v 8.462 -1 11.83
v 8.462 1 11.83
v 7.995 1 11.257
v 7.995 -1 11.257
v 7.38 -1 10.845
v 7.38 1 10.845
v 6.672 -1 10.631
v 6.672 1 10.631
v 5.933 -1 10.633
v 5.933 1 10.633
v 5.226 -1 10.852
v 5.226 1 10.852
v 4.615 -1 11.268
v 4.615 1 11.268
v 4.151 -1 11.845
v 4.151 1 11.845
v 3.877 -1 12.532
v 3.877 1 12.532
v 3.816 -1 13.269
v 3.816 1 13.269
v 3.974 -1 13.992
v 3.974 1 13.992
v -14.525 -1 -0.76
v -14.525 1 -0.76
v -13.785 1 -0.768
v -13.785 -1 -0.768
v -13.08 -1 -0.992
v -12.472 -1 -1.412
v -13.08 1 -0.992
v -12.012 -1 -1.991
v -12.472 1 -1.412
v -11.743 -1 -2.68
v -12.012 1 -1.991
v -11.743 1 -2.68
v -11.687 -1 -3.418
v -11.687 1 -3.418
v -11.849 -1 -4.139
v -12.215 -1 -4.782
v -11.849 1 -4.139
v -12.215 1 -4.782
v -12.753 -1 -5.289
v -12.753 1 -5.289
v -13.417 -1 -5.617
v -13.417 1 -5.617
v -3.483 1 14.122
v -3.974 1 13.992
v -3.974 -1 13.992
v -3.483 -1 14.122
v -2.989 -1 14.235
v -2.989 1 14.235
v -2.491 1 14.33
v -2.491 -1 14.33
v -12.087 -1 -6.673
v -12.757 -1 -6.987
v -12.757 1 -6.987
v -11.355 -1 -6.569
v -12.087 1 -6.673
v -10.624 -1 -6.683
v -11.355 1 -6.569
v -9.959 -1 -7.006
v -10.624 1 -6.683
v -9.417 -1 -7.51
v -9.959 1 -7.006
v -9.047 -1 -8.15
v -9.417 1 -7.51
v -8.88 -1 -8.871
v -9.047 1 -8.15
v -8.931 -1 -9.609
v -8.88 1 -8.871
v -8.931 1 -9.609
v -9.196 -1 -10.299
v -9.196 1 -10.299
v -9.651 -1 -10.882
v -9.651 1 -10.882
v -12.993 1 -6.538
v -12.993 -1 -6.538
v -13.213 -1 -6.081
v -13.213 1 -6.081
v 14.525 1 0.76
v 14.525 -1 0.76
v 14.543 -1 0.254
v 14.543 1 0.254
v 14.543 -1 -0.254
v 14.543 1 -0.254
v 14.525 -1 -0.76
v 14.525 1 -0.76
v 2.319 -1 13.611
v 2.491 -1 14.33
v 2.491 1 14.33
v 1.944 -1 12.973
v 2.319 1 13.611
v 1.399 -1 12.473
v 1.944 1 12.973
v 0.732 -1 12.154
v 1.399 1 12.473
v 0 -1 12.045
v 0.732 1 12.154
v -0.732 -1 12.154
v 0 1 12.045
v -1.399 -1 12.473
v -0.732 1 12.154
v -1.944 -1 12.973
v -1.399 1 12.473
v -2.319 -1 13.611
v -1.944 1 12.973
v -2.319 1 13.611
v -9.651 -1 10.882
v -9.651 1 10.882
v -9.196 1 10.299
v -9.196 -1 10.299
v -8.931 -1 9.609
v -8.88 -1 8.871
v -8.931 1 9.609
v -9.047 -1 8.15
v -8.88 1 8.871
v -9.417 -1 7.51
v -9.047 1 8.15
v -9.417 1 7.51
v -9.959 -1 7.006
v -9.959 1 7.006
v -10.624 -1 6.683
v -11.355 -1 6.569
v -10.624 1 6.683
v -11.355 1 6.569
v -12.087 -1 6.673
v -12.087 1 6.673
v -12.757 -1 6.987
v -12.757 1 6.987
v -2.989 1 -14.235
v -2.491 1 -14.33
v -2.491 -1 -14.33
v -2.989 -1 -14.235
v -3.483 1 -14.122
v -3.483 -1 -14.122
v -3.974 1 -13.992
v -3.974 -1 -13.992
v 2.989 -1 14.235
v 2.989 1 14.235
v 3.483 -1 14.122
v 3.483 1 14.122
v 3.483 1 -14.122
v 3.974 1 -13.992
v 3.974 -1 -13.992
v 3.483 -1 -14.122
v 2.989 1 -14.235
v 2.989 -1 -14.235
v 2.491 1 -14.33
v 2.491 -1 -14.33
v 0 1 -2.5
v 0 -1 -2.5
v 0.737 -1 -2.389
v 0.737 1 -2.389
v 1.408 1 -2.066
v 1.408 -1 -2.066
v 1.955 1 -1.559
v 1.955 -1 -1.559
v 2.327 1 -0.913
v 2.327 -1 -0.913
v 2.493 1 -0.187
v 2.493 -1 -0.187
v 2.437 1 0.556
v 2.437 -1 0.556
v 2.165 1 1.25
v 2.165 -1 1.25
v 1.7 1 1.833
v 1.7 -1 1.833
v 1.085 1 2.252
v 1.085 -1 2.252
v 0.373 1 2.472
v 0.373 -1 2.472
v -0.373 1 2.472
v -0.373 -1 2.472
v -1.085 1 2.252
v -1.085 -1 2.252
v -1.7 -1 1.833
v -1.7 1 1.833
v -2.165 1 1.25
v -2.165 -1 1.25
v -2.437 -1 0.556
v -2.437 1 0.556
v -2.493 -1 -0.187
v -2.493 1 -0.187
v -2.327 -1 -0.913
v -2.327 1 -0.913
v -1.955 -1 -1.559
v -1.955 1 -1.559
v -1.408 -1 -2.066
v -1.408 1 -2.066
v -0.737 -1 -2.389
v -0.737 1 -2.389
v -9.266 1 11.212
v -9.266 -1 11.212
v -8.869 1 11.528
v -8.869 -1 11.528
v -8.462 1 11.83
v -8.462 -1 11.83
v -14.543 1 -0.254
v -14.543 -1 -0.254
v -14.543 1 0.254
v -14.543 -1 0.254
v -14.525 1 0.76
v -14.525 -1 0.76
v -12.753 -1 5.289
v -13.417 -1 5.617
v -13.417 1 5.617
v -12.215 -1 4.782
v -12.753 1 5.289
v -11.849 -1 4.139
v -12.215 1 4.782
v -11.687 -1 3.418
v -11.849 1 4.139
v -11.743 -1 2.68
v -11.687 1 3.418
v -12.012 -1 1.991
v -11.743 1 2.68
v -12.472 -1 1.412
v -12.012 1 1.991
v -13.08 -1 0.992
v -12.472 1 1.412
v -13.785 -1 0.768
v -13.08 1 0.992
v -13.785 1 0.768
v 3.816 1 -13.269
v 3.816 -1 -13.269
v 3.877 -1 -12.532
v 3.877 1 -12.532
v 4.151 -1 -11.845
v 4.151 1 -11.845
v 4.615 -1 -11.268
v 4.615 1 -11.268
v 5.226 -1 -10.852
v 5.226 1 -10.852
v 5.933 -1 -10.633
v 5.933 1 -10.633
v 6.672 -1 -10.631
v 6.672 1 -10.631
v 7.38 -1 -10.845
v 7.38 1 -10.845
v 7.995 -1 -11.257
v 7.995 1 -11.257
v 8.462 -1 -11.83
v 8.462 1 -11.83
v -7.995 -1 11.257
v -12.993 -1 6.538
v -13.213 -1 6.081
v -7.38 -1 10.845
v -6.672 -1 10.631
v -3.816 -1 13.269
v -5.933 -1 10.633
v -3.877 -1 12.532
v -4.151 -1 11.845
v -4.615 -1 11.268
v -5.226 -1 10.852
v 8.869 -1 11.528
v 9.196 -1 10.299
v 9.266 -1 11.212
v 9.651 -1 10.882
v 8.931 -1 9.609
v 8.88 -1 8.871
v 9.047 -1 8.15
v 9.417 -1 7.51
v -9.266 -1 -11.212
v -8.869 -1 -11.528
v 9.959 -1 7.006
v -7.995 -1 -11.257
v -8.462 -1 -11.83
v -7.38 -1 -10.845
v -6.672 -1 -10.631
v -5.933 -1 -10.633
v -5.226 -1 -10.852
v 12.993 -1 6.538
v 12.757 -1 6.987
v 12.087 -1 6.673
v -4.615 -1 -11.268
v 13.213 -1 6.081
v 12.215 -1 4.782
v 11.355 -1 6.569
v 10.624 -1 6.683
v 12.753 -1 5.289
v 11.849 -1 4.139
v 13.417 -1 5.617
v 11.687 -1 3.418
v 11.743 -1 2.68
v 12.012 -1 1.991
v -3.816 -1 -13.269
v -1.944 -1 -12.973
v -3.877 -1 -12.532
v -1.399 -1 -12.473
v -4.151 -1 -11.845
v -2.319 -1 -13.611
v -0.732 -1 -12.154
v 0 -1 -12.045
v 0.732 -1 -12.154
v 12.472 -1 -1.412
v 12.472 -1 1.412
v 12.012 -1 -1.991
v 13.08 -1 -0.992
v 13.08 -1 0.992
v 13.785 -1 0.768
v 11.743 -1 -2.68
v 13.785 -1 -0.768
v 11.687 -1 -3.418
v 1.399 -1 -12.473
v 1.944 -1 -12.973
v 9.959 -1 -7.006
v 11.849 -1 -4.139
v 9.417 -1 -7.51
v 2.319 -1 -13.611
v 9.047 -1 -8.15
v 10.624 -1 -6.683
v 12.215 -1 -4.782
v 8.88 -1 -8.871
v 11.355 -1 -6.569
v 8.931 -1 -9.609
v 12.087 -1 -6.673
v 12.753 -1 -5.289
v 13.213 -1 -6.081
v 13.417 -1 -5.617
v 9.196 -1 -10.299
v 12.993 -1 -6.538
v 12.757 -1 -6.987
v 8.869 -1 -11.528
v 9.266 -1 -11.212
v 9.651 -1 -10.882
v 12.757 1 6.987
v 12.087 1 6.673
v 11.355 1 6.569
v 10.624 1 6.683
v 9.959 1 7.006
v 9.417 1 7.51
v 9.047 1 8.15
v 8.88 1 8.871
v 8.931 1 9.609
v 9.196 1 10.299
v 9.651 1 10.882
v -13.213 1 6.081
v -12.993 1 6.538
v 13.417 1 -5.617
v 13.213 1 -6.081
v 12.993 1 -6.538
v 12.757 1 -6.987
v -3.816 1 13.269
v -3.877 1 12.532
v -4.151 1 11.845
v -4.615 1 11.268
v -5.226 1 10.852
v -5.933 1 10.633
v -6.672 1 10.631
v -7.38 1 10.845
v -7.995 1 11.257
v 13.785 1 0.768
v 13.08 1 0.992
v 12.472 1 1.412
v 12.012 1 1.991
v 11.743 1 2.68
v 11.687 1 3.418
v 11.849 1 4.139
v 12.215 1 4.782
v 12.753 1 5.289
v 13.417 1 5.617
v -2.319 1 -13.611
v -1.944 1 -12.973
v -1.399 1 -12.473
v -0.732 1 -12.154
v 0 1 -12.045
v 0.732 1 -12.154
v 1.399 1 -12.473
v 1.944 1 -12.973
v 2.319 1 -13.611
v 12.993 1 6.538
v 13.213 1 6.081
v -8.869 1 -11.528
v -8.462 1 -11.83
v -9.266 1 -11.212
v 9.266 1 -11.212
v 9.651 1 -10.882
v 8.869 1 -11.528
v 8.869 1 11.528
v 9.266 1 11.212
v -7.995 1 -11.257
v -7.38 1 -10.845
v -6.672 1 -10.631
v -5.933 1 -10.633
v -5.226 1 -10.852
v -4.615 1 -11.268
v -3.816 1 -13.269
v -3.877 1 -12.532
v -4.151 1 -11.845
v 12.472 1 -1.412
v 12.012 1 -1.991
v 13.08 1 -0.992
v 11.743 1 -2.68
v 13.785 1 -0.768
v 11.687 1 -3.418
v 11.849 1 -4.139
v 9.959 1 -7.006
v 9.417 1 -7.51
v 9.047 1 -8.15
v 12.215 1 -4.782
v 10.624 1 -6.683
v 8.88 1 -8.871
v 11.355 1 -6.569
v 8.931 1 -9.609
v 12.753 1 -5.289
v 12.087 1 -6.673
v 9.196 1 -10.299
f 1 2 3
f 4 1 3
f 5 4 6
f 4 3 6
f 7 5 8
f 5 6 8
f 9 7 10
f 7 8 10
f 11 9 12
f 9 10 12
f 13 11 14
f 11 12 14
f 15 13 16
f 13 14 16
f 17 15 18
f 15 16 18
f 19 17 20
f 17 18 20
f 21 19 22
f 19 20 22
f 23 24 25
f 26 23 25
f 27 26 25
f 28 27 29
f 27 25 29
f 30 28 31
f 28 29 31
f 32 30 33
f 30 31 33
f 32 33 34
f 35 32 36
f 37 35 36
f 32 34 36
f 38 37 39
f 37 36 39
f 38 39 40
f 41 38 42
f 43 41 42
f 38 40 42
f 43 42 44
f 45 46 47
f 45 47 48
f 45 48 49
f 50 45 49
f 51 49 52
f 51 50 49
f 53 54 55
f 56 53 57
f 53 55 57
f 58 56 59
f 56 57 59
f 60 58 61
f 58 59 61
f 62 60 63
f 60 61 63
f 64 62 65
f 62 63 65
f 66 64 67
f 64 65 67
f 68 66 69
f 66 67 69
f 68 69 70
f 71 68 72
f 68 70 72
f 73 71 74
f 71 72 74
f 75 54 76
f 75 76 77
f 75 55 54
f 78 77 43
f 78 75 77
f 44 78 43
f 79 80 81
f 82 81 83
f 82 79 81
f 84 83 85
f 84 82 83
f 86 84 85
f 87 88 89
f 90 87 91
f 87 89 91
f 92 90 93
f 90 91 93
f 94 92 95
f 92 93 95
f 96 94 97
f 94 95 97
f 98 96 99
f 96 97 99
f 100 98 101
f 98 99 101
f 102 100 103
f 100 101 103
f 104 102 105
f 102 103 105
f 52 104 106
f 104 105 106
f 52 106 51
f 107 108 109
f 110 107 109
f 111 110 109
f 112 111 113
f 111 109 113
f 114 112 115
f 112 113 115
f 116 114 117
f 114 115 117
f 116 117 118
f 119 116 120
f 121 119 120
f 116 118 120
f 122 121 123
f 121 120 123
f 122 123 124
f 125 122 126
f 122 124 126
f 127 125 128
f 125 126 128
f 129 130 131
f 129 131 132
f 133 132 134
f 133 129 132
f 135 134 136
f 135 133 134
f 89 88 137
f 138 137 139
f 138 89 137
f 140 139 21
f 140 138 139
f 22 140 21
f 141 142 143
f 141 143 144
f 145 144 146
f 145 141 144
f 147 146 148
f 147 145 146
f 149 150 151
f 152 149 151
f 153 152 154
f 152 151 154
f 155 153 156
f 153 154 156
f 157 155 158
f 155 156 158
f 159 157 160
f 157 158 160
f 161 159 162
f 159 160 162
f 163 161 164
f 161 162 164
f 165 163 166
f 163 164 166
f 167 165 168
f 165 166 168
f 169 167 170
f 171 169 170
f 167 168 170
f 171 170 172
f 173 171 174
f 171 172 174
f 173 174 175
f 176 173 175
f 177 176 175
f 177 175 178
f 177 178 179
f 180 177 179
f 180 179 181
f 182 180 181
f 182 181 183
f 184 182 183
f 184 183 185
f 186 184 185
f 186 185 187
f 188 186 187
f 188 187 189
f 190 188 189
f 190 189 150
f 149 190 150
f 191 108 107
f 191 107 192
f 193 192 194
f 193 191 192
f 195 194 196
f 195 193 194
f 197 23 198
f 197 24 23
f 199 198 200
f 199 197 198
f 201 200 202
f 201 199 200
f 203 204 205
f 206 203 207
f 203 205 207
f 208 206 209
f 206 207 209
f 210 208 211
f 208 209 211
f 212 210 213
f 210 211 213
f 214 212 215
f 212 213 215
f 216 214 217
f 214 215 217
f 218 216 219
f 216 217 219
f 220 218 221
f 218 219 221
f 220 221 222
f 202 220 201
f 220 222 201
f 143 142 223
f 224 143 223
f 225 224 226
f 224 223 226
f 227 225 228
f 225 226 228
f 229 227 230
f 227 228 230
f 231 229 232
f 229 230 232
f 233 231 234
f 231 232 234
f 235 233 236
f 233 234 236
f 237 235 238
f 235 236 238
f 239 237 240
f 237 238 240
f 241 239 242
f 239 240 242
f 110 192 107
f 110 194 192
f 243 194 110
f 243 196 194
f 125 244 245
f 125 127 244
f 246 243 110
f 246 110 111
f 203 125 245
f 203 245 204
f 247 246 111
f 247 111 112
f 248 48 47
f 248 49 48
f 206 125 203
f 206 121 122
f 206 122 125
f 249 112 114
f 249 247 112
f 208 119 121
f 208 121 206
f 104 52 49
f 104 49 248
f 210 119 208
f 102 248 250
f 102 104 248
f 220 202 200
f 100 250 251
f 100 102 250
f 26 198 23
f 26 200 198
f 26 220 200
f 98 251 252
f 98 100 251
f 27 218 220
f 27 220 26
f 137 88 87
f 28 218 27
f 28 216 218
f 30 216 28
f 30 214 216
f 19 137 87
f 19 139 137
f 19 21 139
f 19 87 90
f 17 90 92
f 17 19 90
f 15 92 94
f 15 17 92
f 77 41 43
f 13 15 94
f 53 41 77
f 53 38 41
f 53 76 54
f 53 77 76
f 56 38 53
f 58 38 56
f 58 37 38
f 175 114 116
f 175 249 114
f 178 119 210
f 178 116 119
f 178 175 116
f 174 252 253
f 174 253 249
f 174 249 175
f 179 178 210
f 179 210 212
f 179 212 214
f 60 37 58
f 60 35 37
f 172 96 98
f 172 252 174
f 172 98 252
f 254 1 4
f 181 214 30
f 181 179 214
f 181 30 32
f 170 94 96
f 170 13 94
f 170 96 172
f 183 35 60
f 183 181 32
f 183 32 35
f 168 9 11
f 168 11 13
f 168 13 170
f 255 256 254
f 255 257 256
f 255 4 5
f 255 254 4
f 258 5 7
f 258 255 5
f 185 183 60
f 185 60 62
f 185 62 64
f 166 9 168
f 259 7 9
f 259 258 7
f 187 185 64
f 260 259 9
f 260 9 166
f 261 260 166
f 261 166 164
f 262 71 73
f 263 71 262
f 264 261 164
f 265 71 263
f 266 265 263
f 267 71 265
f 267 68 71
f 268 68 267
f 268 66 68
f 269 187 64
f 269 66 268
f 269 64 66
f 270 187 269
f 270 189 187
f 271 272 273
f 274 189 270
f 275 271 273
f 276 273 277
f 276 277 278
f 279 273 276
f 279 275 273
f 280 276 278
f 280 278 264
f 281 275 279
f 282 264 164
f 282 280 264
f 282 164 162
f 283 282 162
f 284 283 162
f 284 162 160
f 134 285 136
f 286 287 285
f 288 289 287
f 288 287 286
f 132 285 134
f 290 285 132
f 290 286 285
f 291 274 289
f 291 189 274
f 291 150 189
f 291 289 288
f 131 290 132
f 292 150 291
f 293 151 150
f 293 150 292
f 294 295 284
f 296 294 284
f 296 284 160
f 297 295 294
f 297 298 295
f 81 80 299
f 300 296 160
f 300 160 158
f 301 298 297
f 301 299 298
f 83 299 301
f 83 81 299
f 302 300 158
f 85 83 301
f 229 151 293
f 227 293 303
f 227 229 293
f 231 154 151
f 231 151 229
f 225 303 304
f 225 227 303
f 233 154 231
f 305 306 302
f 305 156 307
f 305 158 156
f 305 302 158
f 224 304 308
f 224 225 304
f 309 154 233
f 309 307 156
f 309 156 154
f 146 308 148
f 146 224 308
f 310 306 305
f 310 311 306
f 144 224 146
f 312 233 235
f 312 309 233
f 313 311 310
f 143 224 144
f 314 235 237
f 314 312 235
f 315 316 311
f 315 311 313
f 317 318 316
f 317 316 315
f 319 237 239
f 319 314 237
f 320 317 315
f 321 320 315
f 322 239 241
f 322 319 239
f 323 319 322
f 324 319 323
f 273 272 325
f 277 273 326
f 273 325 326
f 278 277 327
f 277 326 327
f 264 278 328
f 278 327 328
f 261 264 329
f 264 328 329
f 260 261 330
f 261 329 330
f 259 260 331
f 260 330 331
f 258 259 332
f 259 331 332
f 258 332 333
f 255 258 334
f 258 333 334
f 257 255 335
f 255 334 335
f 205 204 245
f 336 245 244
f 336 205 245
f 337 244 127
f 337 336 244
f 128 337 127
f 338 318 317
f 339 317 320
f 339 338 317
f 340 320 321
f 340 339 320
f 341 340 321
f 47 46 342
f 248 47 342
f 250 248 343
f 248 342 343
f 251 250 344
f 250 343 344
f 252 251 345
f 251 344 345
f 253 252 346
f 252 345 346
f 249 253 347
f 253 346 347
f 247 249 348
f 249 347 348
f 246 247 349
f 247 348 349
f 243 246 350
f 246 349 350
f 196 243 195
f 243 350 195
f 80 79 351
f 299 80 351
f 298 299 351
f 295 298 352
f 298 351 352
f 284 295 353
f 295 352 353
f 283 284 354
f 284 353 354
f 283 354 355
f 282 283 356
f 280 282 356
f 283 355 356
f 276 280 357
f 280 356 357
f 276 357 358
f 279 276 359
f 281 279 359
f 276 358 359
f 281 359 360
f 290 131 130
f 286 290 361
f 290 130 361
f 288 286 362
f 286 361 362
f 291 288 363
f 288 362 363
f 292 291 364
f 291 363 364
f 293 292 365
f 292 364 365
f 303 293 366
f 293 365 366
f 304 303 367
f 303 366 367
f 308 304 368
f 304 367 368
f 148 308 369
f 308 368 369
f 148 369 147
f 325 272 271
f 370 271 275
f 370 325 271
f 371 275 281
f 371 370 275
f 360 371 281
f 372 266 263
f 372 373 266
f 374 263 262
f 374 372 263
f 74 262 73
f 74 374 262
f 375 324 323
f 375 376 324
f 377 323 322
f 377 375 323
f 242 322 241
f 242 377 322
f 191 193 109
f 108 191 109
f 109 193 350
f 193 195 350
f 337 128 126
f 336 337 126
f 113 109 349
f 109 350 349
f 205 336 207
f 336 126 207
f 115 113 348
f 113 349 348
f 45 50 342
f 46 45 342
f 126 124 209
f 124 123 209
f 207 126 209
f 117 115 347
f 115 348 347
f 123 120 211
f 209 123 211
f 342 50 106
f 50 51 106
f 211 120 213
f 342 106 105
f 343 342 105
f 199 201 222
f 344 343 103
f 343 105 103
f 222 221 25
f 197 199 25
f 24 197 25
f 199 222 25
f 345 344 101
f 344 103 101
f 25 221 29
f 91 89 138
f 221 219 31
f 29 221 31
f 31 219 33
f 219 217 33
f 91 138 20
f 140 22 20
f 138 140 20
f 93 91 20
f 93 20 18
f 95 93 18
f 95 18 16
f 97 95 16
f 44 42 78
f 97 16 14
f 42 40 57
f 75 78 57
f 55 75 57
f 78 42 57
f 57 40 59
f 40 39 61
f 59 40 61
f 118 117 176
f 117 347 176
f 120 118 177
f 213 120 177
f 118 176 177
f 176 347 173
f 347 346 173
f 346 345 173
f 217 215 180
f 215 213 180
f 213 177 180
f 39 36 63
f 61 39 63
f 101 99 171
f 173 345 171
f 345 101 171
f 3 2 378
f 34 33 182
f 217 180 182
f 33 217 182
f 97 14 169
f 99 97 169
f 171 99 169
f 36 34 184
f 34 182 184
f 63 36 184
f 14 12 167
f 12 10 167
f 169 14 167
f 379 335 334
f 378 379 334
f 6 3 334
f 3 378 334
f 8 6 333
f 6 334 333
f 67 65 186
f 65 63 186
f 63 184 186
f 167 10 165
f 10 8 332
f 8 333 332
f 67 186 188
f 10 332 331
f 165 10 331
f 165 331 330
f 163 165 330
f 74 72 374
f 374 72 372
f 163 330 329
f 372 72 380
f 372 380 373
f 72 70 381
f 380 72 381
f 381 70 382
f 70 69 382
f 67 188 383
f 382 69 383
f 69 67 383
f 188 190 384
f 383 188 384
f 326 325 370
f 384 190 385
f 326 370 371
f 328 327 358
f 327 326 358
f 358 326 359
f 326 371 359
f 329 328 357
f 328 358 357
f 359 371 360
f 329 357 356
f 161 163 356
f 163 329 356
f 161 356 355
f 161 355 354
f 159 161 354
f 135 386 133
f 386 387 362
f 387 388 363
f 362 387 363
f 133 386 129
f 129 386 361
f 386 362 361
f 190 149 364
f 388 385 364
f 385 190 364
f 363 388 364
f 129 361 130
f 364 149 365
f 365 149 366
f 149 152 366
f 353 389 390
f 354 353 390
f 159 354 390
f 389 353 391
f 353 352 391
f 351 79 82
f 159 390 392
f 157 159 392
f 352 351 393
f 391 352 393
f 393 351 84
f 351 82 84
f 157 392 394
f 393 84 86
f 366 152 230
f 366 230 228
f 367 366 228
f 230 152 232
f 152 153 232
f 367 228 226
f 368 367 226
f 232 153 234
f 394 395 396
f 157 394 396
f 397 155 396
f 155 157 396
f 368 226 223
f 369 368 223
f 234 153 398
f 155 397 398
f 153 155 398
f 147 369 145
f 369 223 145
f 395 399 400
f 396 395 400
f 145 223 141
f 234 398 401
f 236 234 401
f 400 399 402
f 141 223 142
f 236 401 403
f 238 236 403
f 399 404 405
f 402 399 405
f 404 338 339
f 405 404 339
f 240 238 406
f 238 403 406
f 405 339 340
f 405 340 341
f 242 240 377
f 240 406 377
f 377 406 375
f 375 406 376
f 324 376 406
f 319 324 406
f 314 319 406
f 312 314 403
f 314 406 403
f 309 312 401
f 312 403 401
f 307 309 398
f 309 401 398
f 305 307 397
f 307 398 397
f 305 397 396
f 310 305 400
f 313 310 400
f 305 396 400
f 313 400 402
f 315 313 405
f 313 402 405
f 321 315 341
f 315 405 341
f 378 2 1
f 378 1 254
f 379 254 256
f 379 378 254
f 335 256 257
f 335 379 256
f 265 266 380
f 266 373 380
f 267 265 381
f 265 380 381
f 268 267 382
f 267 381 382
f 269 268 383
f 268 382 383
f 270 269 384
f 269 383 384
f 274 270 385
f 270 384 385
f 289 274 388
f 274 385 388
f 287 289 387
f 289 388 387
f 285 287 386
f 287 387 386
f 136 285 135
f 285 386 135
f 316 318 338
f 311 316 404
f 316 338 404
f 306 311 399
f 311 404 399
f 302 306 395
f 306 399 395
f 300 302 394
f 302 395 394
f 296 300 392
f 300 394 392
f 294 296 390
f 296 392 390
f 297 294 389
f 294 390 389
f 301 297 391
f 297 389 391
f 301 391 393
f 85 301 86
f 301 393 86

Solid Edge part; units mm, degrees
sketch "Sketch1" plane through (0, 0, 0) normal (0, -1, 0) x (1, 0, 0)
  circle A0 centre (0, 0) radius 14.545
extrude "Protrusion1" add sketch "Sketch1" along normal mid plane 2
hole "Hole_16" at (0, 1, 14.545) direction (0, -1, 0) diameter 5 end up to next
pattern_circular "Pattern_2" count 14 over 360 about axis through (0, 1, 0) along (0, -1, 0) of "Hole_16"
hole "Hole_30" at (0, -1, 0) direction (0, 1, 0) diameter 5 end up to next
